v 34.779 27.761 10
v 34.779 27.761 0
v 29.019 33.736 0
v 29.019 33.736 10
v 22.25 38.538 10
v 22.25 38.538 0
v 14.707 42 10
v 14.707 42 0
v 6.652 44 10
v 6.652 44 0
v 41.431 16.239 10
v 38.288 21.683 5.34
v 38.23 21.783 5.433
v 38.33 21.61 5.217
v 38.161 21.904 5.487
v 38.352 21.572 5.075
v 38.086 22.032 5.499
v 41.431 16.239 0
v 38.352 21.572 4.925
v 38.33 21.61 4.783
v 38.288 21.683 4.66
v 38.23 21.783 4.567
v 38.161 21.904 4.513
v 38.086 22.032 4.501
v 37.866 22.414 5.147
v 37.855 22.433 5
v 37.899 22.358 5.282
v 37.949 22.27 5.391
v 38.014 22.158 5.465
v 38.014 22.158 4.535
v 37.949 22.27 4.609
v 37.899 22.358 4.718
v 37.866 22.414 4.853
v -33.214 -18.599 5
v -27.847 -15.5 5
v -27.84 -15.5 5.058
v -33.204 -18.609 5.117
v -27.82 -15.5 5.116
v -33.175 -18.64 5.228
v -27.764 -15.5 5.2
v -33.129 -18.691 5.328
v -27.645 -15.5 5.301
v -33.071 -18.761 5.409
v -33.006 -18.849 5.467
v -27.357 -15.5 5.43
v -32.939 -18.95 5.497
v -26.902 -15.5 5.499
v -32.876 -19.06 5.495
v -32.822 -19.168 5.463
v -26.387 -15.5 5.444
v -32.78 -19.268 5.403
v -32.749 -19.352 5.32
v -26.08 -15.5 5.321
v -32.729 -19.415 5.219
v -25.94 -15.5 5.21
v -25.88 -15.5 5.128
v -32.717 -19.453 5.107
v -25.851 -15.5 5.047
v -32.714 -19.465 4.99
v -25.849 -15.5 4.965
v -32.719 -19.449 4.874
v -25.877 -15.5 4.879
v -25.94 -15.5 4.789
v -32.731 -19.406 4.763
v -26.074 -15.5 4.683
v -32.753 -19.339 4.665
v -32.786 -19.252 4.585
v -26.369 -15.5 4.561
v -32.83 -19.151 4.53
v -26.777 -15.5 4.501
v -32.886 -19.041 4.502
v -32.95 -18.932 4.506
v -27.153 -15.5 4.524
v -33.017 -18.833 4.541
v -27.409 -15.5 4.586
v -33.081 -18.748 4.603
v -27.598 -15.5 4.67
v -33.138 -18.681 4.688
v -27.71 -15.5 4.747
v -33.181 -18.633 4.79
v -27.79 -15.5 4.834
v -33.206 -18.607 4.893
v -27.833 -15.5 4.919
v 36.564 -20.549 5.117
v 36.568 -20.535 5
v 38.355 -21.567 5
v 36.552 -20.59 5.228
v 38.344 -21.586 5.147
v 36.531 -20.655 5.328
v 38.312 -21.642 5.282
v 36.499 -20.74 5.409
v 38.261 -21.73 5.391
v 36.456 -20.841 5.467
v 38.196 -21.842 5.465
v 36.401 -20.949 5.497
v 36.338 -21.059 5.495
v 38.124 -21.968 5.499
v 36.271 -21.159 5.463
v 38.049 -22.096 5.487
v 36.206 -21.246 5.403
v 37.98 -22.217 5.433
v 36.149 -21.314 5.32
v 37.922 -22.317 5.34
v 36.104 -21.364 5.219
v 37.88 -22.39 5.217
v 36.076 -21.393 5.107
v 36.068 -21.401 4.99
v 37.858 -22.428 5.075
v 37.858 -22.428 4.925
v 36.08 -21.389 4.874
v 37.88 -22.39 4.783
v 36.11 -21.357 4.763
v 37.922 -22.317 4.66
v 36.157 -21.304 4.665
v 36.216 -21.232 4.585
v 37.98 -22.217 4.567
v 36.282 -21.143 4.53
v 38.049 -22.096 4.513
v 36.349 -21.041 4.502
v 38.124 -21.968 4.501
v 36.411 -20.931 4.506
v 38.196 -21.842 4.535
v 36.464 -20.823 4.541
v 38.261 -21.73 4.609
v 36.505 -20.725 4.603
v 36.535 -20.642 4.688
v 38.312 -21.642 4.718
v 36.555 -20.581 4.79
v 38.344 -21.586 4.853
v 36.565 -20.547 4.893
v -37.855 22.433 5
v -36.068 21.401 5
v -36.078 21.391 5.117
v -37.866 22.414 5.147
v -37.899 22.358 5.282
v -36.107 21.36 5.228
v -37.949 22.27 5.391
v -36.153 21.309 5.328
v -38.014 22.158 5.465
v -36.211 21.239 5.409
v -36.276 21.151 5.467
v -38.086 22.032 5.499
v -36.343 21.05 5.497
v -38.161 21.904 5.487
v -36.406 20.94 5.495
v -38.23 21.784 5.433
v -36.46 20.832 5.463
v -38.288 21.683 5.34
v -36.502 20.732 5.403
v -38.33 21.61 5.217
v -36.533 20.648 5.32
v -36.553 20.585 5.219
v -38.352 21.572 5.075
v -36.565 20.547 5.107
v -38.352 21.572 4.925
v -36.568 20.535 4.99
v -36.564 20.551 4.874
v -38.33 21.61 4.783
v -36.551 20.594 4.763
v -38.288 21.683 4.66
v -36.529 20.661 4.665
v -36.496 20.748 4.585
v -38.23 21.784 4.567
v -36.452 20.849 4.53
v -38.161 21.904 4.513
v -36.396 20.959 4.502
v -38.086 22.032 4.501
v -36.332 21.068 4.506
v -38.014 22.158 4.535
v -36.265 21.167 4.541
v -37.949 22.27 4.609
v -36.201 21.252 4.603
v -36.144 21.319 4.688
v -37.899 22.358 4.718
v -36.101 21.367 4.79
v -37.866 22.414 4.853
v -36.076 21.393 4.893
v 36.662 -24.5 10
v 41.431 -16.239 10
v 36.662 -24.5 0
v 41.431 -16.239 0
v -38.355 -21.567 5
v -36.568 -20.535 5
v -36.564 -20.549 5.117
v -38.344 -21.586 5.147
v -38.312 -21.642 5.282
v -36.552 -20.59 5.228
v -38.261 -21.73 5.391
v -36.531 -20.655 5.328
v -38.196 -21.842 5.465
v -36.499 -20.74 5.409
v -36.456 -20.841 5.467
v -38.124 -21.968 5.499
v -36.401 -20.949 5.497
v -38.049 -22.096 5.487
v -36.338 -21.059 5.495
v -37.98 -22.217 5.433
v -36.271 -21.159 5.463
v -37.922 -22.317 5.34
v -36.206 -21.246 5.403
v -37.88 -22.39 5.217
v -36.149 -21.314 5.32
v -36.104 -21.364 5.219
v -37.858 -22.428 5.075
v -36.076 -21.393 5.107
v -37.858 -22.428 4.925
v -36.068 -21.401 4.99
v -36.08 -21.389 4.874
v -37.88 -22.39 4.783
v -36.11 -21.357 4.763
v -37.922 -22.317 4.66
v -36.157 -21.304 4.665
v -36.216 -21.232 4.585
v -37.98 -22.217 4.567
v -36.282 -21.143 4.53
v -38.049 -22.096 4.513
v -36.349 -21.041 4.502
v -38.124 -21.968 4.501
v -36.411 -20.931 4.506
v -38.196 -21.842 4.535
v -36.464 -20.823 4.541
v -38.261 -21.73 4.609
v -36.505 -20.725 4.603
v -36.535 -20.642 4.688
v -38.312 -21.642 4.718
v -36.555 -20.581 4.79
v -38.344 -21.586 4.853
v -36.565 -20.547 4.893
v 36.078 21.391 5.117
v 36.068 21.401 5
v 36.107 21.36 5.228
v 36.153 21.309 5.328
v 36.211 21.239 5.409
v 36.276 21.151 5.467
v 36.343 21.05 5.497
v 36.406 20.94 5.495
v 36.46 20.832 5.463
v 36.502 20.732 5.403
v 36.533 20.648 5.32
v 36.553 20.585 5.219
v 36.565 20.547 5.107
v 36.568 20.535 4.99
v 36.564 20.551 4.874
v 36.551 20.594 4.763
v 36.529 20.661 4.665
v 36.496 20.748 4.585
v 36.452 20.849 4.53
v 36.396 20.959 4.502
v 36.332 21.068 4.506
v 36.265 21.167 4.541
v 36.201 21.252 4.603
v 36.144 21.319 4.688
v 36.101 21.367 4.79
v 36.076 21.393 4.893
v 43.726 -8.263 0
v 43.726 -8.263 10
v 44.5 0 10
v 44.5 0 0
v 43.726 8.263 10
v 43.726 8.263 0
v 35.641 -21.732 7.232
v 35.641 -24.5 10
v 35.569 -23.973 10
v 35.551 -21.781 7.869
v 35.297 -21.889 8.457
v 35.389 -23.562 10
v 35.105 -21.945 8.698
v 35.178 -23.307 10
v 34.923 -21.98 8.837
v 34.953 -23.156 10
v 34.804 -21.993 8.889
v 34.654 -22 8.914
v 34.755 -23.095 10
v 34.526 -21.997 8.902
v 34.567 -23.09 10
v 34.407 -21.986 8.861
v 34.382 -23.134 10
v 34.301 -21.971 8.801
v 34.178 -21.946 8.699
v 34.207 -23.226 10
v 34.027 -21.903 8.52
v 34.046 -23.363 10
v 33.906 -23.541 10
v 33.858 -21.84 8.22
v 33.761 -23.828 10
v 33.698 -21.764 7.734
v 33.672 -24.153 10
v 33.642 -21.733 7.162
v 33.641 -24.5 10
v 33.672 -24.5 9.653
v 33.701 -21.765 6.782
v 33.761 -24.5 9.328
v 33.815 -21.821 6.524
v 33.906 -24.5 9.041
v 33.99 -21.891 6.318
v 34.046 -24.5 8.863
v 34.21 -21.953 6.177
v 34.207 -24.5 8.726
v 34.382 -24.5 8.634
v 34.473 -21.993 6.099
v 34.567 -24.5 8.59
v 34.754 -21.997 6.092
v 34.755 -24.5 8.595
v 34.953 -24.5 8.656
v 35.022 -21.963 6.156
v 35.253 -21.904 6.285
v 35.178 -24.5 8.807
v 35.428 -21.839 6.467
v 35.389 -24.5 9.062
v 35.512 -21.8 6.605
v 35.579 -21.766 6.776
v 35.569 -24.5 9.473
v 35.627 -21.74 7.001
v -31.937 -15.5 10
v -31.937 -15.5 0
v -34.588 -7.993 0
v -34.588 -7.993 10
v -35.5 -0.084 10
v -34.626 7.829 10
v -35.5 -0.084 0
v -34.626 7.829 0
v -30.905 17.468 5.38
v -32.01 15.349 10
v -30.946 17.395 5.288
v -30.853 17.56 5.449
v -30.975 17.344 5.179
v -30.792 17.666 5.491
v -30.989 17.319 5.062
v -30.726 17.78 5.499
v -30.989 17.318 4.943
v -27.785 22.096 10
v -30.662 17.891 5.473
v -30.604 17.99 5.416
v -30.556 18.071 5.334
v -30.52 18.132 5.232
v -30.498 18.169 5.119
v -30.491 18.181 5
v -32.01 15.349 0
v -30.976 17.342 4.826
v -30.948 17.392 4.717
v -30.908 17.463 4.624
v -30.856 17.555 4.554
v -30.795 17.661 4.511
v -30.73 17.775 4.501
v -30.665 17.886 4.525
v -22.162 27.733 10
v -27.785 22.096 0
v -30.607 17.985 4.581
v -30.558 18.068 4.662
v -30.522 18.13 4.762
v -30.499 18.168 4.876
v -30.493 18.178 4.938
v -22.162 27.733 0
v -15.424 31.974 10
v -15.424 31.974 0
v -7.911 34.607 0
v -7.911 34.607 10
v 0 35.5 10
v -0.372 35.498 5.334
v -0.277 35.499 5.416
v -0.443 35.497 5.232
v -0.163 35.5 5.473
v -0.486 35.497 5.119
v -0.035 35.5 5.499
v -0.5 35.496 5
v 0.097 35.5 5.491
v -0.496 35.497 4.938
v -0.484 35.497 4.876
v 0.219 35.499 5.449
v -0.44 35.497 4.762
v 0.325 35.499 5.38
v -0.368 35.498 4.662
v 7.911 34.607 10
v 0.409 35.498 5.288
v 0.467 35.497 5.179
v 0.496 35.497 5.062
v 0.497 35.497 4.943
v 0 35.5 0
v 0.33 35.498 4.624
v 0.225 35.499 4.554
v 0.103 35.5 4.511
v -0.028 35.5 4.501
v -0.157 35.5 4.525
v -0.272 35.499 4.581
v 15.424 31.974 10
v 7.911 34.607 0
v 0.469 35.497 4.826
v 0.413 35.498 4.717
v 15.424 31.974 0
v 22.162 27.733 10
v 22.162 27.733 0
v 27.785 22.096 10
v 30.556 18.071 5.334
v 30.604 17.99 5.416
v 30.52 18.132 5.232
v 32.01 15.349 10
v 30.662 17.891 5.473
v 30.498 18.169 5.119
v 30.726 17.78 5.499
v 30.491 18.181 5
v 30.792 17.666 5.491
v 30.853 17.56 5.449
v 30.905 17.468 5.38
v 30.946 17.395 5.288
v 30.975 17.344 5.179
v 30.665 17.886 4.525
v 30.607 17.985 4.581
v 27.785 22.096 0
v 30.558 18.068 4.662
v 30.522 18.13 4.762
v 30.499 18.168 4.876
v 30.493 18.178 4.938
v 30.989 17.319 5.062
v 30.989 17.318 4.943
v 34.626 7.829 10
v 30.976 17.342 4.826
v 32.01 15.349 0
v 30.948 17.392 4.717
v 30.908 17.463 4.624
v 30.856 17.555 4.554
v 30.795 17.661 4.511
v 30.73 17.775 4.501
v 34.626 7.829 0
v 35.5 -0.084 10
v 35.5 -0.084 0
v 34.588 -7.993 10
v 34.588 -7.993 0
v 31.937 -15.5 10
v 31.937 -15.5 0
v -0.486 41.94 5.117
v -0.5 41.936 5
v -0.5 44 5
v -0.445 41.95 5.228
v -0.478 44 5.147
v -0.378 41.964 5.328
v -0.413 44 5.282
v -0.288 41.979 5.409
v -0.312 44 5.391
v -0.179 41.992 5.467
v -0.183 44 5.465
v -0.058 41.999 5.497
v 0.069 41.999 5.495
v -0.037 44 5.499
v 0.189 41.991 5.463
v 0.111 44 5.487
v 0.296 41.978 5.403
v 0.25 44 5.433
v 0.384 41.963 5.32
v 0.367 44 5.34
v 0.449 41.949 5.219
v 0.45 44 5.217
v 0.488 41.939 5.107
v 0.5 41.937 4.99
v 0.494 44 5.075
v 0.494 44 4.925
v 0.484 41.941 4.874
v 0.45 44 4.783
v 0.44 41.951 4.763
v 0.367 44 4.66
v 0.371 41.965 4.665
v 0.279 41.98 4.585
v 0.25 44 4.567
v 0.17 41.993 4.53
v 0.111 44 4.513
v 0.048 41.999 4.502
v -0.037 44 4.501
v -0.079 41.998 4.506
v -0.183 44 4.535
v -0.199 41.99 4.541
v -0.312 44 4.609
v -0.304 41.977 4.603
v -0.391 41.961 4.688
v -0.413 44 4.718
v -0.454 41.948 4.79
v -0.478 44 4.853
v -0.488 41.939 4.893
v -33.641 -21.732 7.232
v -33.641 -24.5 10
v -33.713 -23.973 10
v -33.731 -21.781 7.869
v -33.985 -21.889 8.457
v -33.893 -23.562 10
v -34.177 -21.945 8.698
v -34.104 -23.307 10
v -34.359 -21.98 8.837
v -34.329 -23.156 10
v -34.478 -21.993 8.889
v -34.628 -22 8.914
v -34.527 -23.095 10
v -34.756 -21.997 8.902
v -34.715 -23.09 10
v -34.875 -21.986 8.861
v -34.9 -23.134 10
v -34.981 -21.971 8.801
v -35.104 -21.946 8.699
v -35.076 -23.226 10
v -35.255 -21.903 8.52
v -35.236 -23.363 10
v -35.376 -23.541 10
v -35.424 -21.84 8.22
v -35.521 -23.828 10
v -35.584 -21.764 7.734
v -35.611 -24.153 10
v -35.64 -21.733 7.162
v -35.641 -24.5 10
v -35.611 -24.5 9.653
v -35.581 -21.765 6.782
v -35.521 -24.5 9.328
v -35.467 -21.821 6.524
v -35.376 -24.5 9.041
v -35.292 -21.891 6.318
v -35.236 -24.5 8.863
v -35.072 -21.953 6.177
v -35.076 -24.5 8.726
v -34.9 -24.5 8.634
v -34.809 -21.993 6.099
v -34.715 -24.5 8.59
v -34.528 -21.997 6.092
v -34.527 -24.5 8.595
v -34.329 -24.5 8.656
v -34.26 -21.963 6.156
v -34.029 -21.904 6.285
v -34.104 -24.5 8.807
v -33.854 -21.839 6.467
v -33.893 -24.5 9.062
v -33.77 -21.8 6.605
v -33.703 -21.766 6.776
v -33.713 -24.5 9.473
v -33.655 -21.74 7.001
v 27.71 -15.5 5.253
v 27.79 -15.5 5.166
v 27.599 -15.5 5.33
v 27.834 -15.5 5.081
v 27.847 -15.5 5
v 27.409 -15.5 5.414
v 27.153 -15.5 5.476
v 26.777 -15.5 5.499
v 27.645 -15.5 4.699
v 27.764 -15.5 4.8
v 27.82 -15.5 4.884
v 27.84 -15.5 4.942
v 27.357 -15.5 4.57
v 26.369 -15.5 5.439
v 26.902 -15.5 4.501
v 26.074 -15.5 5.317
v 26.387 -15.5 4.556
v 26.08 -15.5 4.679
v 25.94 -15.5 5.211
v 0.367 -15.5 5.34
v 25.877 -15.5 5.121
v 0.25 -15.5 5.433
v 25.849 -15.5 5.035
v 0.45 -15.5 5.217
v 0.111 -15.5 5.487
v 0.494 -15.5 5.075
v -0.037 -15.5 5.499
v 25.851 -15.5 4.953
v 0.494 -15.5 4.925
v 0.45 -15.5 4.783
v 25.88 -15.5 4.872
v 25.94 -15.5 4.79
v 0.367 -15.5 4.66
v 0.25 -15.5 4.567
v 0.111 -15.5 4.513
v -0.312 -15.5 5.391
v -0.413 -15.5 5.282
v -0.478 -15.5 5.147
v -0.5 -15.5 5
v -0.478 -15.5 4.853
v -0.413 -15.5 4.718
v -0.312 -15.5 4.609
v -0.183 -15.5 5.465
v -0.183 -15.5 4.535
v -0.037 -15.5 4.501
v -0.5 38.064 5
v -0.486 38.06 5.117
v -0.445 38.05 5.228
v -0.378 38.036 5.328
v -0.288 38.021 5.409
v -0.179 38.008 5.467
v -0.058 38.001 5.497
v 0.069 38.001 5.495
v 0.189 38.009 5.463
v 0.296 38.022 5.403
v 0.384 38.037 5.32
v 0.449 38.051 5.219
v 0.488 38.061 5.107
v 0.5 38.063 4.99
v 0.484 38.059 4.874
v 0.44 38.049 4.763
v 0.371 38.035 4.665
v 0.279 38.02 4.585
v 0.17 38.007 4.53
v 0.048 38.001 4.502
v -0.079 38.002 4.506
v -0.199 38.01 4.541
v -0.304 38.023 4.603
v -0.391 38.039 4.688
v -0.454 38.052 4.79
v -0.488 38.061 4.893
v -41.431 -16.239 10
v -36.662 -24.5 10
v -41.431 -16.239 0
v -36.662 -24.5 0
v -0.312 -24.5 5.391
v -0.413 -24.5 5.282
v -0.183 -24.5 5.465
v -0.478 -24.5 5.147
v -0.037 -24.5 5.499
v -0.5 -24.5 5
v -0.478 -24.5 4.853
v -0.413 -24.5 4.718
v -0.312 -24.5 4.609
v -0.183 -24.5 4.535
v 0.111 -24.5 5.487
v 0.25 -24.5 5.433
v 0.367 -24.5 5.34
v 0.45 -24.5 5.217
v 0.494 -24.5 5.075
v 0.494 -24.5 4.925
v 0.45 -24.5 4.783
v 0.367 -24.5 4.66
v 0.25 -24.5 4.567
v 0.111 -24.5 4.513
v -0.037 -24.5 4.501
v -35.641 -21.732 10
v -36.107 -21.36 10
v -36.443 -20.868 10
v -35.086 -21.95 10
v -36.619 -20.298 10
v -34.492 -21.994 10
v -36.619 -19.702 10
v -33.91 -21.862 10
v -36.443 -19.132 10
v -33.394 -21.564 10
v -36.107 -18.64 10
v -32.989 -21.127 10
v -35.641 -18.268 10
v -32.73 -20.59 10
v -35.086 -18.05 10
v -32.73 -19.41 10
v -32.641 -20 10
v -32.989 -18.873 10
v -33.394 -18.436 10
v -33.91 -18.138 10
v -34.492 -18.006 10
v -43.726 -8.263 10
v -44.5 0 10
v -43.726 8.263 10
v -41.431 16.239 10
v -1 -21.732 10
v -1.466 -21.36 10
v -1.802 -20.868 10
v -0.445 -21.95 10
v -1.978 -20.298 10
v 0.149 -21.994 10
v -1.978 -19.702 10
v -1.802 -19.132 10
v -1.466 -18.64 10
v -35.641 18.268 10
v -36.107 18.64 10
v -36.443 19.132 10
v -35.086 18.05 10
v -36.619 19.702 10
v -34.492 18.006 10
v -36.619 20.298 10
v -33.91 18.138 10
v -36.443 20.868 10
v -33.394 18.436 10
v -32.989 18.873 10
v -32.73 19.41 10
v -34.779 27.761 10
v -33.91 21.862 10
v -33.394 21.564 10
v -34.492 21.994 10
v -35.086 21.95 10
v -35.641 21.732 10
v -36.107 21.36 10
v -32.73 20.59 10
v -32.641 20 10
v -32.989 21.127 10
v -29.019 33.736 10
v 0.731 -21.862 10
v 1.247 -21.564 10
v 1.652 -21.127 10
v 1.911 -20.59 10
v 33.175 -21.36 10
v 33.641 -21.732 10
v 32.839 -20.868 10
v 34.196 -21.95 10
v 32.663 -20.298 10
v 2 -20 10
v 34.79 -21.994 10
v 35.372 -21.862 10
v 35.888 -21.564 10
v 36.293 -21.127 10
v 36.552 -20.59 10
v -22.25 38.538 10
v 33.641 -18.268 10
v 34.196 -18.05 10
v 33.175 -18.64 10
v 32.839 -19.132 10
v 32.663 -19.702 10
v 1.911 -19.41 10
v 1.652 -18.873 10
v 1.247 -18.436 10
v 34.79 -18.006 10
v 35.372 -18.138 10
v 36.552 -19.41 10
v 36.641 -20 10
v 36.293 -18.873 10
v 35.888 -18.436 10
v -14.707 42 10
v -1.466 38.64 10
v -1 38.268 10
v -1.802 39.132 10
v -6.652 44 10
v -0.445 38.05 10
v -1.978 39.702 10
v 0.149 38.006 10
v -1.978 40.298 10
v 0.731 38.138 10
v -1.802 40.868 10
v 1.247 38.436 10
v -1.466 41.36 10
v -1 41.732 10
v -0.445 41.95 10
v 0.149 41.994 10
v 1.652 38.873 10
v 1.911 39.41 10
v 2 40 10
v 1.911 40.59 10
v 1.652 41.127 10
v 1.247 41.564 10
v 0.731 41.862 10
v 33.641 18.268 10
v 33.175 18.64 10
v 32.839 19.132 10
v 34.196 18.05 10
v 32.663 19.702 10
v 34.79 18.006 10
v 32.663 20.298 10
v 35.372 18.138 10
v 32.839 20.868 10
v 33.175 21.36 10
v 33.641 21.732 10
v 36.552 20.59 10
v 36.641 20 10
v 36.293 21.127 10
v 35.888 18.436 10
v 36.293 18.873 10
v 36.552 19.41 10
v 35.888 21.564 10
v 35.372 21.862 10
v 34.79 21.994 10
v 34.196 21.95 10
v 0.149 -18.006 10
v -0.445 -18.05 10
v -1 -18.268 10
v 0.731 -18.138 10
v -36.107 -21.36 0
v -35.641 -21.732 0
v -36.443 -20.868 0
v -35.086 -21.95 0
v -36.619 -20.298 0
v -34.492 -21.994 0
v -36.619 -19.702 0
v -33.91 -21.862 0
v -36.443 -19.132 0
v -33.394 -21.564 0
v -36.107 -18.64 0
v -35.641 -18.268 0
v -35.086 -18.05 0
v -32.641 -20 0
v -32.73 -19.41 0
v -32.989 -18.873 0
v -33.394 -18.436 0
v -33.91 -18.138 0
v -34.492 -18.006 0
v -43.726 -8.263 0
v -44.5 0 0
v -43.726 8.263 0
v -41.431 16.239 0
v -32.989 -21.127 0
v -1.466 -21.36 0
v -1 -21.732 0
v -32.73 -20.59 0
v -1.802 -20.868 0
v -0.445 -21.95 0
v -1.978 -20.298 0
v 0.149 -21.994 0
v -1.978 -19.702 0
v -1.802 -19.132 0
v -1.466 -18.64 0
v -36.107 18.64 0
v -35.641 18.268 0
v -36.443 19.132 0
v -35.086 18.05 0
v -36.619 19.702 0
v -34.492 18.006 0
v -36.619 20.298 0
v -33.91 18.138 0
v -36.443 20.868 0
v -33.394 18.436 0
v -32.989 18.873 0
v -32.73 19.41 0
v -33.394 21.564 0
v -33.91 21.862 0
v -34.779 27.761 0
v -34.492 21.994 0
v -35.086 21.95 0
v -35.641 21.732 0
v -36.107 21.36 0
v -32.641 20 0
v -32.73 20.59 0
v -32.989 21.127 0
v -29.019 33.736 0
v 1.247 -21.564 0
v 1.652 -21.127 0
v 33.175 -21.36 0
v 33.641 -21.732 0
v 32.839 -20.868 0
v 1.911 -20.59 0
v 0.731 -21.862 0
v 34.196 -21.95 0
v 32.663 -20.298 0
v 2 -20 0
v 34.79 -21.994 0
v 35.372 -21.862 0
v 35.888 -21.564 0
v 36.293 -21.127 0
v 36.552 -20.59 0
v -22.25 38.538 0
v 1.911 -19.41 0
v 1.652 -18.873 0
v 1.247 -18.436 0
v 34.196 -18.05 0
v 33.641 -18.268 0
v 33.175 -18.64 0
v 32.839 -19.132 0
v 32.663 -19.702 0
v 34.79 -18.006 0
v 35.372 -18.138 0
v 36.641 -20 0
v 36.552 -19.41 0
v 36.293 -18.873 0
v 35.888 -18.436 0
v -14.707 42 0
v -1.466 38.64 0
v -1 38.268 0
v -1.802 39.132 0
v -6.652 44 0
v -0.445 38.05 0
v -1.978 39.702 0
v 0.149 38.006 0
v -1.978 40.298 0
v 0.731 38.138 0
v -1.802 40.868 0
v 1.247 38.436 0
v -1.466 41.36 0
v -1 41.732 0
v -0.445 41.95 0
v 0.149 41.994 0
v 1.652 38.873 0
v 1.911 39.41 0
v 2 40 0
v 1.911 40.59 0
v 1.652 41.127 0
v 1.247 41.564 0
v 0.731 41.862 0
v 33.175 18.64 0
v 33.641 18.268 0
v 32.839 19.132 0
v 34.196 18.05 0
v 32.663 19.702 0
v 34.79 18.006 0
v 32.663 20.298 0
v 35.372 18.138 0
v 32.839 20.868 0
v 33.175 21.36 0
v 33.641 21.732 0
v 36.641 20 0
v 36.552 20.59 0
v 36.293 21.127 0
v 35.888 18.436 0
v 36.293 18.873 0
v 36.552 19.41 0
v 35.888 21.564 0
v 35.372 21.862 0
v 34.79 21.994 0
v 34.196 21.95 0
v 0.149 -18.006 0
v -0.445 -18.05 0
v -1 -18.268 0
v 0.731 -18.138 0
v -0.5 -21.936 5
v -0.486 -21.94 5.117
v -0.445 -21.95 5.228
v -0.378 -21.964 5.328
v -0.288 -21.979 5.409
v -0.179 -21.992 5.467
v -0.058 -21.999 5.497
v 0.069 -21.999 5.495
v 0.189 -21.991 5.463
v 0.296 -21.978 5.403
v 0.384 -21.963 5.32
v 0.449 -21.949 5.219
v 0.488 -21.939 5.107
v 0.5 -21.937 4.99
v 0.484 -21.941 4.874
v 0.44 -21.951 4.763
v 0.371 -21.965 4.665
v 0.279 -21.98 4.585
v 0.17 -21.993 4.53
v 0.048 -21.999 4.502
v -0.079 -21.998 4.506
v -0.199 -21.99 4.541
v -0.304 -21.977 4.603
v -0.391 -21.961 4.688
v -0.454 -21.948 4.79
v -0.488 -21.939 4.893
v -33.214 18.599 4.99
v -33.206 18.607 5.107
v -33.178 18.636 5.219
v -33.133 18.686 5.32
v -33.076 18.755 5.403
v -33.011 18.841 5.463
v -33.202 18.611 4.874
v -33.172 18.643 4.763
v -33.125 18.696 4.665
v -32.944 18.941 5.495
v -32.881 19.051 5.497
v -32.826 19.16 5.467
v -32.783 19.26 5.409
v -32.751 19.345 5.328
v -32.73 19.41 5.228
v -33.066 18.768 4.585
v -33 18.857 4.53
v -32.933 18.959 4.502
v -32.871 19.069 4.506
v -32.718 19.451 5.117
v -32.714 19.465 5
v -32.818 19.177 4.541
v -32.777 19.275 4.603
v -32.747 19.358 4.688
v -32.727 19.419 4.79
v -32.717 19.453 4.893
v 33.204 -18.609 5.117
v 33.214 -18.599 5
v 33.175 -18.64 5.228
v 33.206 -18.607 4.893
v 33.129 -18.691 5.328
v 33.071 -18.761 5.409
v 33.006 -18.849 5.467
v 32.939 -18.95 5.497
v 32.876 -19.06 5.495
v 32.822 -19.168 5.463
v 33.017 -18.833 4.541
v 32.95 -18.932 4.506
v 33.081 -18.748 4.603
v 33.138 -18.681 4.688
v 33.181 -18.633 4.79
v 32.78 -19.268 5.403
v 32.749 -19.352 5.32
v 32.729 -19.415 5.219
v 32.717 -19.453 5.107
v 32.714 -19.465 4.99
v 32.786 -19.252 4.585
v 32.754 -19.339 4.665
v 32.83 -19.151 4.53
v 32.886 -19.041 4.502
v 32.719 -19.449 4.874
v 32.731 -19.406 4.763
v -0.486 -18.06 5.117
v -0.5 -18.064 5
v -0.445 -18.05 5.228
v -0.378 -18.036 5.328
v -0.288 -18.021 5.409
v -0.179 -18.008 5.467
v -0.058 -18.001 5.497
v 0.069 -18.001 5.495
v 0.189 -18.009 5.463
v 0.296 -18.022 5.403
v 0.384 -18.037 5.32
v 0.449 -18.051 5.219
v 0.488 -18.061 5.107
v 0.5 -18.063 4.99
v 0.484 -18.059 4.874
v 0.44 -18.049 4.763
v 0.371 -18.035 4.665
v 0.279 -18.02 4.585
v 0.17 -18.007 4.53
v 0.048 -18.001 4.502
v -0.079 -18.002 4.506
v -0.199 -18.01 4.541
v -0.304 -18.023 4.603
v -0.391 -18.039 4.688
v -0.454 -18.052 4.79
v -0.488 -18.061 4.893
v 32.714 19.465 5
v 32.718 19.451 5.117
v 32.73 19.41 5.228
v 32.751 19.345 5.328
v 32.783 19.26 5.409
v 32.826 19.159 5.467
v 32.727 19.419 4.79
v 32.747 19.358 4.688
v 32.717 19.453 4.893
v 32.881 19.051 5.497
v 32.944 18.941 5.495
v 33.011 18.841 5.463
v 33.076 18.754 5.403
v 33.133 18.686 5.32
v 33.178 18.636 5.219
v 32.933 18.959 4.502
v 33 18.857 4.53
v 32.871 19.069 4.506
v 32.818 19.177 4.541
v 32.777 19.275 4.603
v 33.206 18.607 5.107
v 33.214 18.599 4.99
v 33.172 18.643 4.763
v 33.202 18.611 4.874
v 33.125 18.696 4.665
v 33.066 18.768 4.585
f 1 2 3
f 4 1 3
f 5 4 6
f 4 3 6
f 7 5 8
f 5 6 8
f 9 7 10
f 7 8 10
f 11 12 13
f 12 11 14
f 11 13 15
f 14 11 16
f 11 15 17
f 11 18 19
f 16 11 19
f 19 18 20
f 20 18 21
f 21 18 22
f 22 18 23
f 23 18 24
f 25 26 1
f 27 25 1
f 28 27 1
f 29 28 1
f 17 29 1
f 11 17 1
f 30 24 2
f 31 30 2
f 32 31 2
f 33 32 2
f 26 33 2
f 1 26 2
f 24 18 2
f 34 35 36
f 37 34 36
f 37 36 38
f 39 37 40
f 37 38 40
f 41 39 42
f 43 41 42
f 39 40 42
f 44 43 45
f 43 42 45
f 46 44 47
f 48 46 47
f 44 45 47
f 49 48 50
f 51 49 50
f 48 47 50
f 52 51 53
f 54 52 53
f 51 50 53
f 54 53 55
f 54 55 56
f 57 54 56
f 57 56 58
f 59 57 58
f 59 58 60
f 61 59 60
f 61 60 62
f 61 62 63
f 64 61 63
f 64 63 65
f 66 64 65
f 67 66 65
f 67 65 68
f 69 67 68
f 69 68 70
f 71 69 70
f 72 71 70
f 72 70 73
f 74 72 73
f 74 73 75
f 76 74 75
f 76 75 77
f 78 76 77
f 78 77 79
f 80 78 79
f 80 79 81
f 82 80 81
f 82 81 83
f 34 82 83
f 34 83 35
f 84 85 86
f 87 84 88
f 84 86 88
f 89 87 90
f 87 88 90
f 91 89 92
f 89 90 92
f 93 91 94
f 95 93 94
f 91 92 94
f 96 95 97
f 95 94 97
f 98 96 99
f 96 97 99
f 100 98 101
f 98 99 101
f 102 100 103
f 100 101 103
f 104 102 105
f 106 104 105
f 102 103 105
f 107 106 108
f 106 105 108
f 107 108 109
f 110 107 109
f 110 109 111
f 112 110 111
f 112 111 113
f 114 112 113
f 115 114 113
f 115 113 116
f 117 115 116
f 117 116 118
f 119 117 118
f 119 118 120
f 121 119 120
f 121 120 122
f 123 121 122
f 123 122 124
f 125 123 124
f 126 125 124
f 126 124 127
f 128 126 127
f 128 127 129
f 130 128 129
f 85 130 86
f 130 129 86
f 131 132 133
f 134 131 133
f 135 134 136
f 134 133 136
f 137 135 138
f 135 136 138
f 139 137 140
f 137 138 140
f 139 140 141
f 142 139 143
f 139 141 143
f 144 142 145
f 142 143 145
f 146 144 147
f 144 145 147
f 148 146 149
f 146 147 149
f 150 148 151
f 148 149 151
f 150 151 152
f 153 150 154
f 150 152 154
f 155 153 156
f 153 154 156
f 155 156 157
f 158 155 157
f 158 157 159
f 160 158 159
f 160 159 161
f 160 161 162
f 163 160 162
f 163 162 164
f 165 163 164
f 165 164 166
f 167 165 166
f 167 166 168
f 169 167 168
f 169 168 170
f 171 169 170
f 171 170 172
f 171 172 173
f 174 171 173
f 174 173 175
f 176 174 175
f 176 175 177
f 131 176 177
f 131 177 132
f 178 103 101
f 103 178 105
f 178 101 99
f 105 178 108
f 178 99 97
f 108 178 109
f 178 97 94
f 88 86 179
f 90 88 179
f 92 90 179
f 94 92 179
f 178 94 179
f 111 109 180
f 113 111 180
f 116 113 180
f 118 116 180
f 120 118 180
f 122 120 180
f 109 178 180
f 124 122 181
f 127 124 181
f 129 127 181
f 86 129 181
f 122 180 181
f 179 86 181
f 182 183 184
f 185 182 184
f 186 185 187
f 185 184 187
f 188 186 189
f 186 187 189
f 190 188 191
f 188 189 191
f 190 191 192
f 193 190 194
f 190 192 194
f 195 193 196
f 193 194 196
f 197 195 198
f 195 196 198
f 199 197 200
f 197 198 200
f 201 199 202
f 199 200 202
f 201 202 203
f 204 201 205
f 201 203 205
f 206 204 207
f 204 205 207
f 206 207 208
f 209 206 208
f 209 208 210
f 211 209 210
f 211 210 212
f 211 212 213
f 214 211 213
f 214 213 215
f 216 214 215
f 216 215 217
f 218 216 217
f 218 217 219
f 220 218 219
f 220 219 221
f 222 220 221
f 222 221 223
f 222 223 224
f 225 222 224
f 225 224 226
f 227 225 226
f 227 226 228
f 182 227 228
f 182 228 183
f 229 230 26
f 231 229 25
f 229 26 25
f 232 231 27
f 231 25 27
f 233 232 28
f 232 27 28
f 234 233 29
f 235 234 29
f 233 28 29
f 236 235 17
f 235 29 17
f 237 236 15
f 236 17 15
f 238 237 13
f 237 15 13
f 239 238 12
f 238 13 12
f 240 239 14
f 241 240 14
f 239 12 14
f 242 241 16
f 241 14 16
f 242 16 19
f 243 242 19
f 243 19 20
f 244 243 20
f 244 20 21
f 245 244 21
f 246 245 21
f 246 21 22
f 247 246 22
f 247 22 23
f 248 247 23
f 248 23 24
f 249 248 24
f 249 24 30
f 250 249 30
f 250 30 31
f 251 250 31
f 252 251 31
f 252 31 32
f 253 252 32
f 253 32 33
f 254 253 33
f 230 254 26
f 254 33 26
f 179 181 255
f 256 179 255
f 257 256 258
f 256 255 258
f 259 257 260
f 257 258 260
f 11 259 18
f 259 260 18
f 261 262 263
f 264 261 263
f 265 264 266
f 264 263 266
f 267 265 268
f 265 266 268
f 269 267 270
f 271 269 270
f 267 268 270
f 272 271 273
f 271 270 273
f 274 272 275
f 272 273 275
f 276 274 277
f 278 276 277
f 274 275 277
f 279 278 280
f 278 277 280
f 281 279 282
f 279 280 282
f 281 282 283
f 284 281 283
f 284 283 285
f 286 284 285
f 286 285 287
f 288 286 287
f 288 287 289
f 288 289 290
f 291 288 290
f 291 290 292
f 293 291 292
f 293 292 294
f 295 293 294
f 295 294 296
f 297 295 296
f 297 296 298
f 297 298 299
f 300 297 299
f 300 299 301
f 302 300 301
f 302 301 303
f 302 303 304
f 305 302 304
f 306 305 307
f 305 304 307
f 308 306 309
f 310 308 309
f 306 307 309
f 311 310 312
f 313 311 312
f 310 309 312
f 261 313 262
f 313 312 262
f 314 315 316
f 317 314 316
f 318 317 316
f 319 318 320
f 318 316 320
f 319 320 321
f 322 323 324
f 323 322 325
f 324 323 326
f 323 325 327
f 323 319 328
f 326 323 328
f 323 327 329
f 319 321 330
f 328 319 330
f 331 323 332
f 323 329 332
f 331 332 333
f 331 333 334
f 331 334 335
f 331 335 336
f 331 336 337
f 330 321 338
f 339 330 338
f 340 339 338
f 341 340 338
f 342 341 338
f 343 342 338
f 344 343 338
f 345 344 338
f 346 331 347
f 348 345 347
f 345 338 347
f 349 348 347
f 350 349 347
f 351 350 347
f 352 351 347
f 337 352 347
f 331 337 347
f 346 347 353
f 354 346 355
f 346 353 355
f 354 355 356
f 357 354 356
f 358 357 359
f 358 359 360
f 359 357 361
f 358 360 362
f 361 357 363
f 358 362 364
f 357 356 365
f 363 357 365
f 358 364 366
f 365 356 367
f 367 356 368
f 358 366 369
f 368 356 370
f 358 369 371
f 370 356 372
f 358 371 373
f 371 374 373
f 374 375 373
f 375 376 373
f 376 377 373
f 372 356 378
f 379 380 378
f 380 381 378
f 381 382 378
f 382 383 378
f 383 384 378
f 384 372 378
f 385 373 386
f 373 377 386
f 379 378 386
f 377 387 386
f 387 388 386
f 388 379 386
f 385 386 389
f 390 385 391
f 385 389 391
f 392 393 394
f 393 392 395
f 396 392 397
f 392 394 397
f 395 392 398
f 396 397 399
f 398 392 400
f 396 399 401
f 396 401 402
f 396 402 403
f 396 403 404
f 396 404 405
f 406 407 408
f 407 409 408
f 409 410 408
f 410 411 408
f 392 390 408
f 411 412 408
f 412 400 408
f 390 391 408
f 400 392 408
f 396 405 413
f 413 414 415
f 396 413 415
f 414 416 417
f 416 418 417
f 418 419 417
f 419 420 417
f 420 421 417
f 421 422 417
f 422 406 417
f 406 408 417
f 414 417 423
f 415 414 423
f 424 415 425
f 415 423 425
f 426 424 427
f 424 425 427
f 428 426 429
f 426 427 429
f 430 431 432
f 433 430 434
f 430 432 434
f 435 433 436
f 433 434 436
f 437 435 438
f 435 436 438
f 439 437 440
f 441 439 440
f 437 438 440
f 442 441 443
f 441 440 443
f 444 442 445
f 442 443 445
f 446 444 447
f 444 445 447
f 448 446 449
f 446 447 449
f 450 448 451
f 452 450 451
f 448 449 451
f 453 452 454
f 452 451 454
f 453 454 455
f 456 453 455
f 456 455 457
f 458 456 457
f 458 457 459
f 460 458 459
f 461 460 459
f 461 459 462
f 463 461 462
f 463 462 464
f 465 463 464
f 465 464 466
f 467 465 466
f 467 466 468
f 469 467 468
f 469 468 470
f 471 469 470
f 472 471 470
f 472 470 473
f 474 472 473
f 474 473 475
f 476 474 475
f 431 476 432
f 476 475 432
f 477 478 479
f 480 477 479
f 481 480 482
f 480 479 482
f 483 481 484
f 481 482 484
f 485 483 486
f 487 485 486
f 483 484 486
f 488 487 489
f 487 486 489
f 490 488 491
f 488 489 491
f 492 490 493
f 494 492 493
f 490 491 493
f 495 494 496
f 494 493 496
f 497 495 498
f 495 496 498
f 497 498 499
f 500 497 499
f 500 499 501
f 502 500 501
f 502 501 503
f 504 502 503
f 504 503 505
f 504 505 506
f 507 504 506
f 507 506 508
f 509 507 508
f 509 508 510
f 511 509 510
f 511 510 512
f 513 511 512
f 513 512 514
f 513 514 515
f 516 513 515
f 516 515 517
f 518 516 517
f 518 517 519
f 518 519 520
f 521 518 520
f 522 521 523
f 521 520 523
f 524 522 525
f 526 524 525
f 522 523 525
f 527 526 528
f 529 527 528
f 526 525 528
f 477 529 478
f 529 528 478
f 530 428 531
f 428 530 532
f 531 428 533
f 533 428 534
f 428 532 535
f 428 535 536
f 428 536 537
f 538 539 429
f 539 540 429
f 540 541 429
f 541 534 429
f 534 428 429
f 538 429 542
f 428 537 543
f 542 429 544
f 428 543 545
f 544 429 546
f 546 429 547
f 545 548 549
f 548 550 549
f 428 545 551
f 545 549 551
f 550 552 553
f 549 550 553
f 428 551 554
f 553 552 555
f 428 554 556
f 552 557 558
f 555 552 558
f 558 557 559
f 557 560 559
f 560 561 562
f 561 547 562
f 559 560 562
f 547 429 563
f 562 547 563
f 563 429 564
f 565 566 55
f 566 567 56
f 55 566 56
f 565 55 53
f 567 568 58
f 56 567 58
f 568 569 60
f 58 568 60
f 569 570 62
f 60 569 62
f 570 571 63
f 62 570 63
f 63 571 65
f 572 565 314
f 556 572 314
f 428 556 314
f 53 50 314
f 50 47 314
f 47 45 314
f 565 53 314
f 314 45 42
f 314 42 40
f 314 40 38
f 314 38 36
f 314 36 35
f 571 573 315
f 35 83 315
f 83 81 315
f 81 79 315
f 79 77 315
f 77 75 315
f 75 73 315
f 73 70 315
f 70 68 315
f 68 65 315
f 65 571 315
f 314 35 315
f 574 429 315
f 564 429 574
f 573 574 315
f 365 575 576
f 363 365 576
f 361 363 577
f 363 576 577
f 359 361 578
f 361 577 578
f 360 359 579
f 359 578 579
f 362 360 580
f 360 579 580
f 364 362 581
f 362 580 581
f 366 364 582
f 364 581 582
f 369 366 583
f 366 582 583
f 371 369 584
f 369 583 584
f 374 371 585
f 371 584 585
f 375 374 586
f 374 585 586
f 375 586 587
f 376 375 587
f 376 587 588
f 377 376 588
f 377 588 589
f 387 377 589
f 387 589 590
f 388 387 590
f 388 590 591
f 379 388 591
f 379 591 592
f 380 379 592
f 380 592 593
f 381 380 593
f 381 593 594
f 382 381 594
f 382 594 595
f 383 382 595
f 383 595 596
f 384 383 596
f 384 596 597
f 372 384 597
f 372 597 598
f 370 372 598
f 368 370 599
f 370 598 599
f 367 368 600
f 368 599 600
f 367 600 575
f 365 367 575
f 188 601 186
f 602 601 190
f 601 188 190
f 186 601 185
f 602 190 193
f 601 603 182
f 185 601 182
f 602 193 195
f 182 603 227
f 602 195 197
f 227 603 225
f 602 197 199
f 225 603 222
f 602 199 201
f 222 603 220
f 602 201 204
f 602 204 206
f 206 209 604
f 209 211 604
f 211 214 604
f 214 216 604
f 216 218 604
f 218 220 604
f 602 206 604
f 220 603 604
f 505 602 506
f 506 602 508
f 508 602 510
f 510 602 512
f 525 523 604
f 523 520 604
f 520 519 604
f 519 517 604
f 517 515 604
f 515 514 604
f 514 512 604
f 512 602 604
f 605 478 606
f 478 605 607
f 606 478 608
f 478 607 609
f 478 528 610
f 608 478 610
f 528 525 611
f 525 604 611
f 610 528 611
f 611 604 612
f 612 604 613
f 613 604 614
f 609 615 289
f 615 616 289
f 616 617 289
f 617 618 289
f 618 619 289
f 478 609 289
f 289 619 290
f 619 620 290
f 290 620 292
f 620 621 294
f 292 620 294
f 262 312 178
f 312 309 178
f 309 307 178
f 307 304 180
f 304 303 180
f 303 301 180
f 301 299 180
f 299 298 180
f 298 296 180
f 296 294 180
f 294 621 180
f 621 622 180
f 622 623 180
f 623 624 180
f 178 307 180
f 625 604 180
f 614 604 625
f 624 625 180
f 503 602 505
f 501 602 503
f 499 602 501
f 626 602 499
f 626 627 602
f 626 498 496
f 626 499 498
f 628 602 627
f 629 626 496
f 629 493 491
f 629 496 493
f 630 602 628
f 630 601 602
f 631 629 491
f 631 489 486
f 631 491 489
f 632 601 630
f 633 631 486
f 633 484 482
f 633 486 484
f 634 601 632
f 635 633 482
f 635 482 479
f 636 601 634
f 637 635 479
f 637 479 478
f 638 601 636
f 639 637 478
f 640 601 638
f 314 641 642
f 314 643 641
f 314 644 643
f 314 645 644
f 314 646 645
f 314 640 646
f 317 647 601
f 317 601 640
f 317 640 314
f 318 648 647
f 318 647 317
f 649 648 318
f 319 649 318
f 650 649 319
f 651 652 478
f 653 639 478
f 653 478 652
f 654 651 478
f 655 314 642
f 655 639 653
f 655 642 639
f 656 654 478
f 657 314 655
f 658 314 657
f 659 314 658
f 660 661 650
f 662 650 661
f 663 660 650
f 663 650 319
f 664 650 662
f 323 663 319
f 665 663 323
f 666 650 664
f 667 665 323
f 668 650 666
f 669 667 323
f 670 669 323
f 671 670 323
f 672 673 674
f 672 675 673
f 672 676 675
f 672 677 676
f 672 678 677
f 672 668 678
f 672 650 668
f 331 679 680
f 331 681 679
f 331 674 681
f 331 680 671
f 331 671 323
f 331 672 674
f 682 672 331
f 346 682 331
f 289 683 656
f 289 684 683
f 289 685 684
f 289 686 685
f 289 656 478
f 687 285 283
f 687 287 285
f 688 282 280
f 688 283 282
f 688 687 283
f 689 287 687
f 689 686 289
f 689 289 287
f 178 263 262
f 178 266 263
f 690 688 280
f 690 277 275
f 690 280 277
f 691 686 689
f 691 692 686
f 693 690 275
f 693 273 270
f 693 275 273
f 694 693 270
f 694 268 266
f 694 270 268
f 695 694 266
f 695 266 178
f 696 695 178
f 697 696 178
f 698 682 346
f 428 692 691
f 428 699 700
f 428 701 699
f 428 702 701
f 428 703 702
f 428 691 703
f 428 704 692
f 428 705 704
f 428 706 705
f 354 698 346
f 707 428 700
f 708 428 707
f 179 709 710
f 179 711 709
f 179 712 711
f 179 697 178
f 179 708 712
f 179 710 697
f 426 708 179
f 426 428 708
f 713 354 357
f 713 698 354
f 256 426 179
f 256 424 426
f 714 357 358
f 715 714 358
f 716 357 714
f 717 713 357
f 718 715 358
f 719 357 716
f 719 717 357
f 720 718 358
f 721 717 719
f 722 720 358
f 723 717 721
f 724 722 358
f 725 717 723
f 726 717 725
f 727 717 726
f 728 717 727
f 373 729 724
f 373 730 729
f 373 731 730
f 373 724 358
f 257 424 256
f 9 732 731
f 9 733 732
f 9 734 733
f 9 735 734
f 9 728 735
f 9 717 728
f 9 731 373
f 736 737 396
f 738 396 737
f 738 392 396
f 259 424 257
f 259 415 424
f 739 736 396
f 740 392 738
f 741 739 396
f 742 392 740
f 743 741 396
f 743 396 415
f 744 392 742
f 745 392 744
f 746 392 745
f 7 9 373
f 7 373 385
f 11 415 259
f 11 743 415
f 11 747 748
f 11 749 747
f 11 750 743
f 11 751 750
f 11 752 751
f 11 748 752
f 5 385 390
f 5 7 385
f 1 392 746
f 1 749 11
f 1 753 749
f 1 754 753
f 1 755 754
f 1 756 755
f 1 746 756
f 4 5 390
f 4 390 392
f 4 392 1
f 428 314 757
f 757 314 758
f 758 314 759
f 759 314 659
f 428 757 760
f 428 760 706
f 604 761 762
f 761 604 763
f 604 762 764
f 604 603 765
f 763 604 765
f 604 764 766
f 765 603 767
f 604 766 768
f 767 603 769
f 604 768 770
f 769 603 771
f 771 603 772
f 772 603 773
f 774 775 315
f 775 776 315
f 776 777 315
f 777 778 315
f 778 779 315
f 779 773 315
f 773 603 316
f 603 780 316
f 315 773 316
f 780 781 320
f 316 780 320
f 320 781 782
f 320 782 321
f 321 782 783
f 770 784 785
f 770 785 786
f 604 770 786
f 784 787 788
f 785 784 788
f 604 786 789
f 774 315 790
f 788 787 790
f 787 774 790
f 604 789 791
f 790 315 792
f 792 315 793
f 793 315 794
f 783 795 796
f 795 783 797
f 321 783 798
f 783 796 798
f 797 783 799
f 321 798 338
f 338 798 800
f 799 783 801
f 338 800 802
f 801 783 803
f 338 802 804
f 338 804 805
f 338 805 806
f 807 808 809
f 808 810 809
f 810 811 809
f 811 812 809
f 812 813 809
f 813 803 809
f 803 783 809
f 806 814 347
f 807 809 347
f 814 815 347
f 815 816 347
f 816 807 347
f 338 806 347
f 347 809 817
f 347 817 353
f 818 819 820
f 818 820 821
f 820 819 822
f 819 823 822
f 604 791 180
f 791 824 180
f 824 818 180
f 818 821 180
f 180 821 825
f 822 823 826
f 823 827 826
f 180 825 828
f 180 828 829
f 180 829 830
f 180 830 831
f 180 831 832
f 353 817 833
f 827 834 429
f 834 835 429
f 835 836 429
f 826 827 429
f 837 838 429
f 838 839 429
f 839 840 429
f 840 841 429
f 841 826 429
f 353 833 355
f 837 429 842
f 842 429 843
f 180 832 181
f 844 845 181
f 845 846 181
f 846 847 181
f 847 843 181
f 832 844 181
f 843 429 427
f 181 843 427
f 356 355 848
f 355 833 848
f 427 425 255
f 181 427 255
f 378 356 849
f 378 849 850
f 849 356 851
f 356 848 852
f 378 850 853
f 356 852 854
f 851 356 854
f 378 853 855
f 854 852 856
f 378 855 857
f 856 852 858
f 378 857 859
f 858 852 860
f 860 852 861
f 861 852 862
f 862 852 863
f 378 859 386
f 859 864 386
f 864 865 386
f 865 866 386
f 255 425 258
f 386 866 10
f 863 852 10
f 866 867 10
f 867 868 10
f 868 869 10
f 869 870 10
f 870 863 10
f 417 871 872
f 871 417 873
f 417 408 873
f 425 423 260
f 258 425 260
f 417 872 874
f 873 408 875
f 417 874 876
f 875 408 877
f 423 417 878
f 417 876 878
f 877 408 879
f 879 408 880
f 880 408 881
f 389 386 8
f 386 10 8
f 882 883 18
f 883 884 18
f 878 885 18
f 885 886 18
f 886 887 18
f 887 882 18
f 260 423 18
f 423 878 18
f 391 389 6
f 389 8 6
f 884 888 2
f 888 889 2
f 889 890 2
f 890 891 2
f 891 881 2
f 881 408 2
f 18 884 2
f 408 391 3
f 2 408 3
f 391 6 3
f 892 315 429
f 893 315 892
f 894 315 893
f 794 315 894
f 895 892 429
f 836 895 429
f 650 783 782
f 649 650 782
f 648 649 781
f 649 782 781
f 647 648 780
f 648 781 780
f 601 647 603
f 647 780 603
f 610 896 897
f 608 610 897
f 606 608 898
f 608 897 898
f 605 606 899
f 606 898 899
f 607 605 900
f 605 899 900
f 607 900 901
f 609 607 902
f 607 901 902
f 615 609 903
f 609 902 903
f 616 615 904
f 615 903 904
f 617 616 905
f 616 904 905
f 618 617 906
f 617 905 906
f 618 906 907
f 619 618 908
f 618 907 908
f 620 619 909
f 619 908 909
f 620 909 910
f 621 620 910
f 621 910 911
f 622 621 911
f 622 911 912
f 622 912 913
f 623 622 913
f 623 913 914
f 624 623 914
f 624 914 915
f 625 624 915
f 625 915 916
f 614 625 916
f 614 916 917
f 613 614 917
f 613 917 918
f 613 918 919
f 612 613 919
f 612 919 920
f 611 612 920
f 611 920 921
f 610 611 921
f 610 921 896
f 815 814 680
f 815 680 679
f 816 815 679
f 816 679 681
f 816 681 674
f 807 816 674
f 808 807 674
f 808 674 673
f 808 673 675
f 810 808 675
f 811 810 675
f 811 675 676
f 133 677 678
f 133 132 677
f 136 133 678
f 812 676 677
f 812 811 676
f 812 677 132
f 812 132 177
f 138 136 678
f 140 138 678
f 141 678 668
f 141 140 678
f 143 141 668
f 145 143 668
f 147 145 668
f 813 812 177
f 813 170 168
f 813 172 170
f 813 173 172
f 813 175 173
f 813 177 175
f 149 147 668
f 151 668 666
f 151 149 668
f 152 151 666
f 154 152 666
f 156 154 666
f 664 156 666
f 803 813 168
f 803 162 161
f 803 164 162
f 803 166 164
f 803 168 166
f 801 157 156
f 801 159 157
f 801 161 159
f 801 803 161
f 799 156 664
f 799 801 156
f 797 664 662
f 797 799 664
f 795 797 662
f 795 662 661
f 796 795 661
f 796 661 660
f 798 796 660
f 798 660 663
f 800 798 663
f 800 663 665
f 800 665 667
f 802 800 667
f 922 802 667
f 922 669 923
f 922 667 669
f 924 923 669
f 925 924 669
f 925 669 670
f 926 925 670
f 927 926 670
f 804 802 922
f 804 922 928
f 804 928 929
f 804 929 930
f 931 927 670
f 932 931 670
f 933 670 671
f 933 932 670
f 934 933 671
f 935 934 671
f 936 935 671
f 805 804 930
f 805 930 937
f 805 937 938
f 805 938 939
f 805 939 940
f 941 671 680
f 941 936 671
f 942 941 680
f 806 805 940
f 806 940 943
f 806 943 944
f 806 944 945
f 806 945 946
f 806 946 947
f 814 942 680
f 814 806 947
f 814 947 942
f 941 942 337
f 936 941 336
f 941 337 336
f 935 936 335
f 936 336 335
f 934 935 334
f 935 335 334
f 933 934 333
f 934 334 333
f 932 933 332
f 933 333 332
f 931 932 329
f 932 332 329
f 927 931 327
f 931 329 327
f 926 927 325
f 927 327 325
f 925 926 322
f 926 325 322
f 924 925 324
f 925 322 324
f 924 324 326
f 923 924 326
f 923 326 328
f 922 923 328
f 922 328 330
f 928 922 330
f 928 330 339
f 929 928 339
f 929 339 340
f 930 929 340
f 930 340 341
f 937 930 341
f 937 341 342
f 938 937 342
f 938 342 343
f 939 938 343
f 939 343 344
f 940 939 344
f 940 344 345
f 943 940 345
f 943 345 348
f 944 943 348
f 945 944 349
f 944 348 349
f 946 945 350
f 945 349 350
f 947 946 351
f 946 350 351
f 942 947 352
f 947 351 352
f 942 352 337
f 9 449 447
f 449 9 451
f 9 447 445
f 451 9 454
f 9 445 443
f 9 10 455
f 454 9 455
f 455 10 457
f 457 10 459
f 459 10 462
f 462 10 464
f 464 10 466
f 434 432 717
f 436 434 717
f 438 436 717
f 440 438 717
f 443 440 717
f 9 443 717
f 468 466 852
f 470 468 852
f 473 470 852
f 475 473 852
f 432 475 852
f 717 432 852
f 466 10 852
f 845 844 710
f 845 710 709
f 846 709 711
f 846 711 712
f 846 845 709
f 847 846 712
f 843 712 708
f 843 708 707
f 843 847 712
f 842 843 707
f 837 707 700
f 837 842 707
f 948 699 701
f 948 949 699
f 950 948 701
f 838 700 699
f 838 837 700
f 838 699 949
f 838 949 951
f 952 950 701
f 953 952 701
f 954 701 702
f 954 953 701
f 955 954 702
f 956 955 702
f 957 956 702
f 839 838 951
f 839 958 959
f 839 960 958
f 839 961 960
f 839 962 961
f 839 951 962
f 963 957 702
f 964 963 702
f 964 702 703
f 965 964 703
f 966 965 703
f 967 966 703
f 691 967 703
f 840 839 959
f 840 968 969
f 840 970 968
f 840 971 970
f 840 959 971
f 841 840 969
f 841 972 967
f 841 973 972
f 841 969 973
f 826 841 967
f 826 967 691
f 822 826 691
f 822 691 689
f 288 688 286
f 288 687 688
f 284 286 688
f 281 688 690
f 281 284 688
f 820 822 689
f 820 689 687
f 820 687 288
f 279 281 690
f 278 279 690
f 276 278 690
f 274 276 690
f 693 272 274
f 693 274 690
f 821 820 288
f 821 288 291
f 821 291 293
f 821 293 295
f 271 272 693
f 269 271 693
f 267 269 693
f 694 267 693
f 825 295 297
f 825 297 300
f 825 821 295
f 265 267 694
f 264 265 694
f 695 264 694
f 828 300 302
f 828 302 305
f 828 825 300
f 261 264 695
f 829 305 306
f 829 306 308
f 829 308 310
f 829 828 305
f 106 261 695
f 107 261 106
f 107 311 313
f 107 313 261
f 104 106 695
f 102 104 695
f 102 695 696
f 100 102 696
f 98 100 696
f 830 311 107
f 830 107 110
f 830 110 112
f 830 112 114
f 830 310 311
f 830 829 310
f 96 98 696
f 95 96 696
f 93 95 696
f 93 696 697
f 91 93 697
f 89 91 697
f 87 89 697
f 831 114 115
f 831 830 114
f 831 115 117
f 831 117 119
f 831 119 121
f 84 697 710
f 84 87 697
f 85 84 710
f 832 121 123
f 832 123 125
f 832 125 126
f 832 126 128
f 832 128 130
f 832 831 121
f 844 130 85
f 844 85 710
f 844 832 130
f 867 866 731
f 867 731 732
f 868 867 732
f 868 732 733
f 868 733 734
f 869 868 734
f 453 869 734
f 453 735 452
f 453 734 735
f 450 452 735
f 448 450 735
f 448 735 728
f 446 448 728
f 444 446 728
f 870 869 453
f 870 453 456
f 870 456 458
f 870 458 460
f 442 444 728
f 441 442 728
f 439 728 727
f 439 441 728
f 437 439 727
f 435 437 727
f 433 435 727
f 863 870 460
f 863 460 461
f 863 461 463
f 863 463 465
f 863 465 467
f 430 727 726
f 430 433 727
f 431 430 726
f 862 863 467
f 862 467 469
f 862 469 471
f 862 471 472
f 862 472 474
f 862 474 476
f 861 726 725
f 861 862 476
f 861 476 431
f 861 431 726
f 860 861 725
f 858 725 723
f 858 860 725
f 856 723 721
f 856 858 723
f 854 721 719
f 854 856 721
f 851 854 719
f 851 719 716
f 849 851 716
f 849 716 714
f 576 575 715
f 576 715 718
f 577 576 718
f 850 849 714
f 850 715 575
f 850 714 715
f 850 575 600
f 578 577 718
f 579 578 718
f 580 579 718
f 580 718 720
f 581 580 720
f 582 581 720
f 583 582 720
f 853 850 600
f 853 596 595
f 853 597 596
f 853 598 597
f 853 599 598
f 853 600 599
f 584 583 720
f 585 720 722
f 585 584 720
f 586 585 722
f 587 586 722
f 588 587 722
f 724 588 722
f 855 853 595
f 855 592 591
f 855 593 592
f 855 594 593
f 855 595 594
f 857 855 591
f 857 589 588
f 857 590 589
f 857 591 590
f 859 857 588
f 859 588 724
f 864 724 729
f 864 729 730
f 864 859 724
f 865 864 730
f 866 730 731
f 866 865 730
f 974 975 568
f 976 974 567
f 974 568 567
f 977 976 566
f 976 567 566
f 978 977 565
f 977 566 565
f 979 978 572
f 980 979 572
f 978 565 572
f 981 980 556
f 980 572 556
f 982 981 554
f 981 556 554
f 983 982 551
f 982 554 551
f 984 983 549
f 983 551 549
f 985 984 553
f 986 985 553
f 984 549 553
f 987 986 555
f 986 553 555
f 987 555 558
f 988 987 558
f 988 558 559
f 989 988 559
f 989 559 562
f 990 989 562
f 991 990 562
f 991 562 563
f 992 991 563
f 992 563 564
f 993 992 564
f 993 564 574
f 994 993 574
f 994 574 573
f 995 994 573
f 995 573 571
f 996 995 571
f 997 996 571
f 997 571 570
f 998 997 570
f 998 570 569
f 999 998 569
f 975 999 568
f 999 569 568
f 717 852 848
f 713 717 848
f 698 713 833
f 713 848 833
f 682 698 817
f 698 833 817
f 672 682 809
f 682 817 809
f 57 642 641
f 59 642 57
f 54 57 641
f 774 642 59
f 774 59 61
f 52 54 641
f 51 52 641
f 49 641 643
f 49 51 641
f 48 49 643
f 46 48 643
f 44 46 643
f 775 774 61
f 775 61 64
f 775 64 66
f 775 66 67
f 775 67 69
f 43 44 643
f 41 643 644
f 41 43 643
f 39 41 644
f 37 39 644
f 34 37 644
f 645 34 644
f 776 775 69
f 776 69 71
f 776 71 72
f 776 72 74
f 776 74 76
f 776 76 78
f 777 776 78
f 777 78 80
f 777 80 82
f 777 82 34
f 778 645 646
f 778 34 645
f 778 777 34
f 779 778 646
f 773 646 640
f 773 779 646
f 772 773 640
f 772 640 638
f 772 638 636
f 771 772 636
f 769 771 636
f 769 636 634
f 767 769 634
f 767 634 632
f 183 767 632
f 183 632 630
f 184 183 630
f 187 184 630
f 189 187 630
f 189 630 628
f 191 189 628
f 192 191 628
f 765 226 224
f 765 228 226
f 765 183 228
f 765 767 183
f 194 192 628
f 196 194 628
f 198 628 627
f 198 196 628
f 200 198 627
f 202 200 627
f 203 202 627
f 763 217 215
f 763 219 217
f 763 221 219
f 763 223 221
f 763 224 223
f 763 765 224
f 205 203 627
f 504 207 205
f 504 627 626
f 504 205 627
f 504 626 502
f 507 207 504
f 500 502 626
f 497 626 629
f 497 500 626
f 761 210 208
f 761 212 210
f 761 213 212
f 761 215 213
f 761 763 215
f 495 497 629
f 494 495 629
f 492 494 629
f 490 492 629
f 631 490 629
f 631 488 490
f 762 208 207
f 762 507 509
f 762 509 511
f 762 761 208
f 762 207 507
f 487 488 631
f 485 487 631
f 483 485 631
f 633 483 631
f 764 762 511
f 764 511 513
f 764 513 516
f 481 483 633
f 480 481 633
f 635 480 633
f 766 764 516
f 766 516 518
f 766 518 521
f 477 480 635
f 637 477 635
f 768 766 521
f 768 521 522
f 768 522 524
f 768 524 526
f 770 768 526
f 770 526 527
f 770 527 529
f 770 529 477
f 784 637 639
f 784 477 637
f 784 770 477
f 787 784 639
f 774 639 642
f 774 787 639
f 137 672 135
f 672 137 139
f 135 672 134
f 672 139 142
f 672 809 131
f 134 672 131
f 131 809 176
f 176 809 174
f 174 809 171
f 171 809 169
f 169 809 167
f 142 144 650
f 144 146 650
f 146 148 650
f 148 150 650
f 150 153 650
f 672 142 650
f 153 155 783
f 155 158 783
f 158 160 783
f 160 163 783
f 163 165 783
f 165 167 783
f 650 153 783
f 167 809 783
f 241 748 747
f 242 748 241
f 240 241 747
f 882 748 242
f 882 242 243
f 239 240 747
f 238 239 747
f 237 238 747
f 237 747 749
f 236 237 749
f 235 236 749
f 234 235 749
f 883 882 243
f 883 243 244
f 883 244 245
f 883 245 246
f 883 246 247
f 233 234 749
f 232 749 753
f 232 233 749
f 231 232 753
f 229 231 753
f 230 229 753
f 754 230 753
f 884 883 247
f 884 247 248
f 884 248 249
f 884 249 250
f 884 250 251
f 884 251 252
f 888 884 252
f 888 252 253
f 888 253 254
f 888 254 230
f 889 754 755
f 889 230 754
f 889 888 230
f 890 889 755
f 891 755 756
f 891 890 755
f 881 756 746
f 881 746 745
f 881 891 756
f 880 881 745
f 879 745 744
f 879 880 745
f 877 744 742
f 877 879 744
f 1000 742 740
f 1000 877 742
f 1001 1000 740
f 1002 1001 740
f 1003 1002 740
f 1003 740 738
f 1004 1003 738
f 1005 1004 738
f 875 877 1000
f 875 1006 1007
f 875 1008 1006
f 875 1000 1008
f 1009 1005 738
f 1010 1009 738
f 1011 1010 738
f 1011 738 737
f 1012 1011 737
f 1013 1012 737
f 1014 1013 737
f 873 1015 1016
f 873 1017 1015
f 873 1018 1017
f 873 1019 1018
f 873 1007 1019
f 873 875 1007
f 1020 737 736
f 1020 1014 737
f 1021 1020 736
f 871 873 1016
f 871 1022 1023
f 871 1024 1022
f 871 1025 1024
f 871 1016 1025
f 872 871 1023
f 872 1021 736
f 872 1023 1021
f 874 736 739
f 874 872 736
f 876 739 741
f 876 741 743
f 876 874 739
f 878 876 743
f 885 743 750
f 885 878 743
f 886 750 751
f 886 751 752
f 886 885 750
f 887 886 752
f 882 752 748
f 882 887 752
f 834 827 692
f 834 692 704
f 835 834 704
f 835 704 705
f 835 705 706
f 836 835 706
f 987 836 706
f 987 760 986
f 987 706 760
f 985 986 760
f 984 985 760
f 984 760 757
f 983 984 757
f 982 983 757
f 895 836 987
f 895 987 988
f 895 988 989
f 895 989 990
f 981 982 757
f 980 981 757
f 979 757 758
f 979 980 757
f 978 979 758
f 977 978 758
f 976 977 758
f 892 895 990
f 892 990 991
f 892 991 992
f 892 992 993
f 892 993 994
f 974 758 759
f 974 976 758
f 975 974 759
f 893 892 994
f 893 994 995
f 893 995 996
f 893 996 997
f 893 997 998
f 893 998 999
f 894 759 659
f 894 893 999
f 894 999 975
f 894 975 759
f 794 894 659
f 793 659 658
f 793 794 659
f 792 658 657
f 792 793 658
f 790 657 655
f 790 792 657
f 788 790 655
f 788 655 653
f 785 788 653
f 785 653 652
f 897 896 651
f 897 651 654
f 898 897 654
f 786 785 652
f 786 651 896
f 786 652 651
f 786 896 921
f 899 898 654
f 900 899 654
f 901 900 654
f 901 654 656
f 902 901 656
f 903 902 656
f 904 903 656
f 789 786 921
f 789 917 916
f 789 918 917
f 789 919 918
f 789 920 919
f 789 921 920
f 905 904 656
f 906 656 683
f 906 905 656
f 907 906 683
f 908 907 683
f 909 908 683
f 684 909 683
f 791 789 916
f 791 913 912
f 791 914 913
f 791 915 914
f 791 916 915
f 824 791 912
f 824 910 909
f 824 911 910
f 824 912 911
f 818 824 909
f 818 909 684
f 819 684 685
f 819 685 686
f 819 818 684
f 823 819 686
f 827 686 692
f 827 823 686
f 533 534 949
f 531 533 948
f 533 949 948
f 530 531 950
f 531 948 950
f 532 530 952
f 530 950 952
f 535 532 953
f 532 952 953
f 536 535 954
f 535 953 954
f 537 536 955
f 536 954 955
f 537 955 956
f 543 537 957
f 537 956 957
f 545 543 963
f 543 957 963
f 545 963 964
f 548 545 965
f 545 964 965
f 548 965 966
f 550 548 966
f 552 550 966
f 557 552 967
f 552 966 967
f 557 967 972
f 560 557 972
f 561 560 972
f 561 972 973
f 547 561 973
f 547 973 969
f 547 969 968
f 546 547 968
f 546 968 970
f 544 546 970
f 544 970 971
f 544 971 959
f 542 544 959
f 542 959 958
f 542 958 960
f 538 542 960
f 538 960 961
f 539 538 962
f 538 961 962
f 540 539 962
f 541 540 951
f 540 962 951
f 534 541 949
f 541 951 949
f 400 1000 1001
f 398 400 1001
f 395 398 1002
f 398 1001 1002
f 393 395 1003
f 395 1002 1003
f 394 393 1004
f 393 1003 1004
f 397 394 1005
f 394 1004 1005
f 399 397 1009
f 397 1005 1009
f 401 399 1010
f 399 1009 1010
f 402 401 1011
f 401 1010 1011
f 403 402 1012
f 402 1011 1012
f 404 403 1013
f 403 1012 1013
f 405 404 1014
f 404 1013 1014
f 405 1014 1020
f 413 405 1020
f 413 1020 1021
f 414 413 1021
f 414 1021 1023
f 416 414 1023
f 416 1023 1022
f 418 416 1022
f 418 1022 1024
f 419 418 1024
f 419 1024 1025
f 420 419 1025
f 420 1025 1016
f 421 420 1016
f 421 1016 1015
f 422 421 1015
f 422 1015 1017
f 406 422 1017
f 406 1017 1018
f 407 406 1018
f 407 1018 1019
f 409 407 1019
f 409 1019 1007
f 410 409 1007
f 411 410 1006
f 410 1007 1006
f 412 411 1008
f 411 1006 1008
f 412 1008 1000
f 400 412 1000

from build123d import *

# Parameters (mm, degrees)
F0_R      = 2
F1_DEPTH  = 10
F3_R      = 1
F4_DEPTH  = 5
F5_R      = 0.5
F6_DEPTH  = 104.53913
F7_R      = 0.5
F8_DEPTH  = 94.789131
F9_R      = 0.5
F10_DEPTH = 68.501


with BuildPart() as f1:
    # F0 (on Top) → F1 (new body)
    with BuildSketch(Plane.XY):
        with BuildLine():
            Line((36.661742, -24.5), (41.431151, -16.239141))
            ThreePointArc((41.431151, -16.239141), (44.5, 0), (41.431151, 16.239141))
            Line((41.431151, 16.239141), (34.779084, 27.760859))
            ThreePointArc((34.779084, 27.760859), (22.25, 38.53813), (6.652067, 44))
            Line((6.652067, 44), (-6.652067, 44))
            ThreePointArc((-6.652067, 44), (-22.25, 38.53813), (-34.779084, 27.760859))
            Line((-34.779084, 27.760859), (-41.431151, 16.239141))
            ThreePointArc((-41.431151, 16.239141), (-44.5, 0), (-41.431151, -16.239141))
            Line((-41.431151, -16.239141), (-36.661742, -24.5))
            Line((-36.661742, -24.5), (36.661742, -24.5))
        make_face()
        with Locations((-34.641016, -20)):
            Circle(F0_R, mode=Mode.SUBTRACT)
        with Locations((0, -20)):
            Circle(F0_R, mode=Mode.SUBTRACT)
        with Locations((34.641016, -20)):
            Circle(F0_R, mode=Mode.SUBTRACT)
        with Locations((-34.641016, 20)):
            Circle(F0_R, mode=Mode.SUBTRACT)
        with BuildLine():
            Line((31.937439, -15.5), (-31.937439, -15.5))
            ThreePointArc((-31.937439, -15.5), (0, 35.5), (31.937439, -15.5))
        make_face(mode=Mode.SUBTRACT)
        with Locations((0, 40)):
            Circle(F0_R, mode=Mode.SUBTRACT)
        with Locations((34.641016, 20)):
            Circle(F0_R, mode=Mode.SUBTRACT)
    extrude(amount=F1_DEPTH)

    # F3 (on face) → F4 (cut)
    with BuildSketch(Plane(origin=(0, -17.25, 17.25), x_dir=(1, 0, 0), z_dir=(0, -0.707107, 0.707107))):
        with Locations((-34.641016, -10.253048)):
            Circle(F3_R)
        with Locations((34.641016, -10.253048)):
            Circle(F3_R)
    extrude(amount=-F4_DEPTH, mode=Mode.SUBTRACT)

    # F5 (on face) → F6 (cut, through all)
    with BuildSketch(Plane(origin=(38.105118, -22, 0), x_dir=(0.5, 0.866025, 0), z_dir=(0.866025, -0.5, 0))):
        with Locations((0, 5)):
            Circle(F5_R)
    extrude(amount=-F6_DEPTH, mode=Mode.SUBTRACT)

    # F7 (on face) → F8 (cut, through all)
    with BuildSketch(Plane(origin=(38.105118, 22, 0), x_dir=(-0.5, 0.866025, 0), z_dir=(0.866025, 0.5, 0))):
        with Locations((0, 5)):
            Circle(F7_R)
    extrude(amount=-F8_DEPTH, mode=Mode.SUBTRACT)

    # F9 (on face) → F10 (cut, through all)
    with BuildSketch(Plane(origin=(0, 44, 0), x_dir=(-1, 0, 0), z_dir=(0, 1, 0))):
        with Locations((0, 5)):
            Circle(F9_R)
    extrude(amount=-F10_DEPTH, mode=Mode.SUBTRACT)


solid = f1.part
